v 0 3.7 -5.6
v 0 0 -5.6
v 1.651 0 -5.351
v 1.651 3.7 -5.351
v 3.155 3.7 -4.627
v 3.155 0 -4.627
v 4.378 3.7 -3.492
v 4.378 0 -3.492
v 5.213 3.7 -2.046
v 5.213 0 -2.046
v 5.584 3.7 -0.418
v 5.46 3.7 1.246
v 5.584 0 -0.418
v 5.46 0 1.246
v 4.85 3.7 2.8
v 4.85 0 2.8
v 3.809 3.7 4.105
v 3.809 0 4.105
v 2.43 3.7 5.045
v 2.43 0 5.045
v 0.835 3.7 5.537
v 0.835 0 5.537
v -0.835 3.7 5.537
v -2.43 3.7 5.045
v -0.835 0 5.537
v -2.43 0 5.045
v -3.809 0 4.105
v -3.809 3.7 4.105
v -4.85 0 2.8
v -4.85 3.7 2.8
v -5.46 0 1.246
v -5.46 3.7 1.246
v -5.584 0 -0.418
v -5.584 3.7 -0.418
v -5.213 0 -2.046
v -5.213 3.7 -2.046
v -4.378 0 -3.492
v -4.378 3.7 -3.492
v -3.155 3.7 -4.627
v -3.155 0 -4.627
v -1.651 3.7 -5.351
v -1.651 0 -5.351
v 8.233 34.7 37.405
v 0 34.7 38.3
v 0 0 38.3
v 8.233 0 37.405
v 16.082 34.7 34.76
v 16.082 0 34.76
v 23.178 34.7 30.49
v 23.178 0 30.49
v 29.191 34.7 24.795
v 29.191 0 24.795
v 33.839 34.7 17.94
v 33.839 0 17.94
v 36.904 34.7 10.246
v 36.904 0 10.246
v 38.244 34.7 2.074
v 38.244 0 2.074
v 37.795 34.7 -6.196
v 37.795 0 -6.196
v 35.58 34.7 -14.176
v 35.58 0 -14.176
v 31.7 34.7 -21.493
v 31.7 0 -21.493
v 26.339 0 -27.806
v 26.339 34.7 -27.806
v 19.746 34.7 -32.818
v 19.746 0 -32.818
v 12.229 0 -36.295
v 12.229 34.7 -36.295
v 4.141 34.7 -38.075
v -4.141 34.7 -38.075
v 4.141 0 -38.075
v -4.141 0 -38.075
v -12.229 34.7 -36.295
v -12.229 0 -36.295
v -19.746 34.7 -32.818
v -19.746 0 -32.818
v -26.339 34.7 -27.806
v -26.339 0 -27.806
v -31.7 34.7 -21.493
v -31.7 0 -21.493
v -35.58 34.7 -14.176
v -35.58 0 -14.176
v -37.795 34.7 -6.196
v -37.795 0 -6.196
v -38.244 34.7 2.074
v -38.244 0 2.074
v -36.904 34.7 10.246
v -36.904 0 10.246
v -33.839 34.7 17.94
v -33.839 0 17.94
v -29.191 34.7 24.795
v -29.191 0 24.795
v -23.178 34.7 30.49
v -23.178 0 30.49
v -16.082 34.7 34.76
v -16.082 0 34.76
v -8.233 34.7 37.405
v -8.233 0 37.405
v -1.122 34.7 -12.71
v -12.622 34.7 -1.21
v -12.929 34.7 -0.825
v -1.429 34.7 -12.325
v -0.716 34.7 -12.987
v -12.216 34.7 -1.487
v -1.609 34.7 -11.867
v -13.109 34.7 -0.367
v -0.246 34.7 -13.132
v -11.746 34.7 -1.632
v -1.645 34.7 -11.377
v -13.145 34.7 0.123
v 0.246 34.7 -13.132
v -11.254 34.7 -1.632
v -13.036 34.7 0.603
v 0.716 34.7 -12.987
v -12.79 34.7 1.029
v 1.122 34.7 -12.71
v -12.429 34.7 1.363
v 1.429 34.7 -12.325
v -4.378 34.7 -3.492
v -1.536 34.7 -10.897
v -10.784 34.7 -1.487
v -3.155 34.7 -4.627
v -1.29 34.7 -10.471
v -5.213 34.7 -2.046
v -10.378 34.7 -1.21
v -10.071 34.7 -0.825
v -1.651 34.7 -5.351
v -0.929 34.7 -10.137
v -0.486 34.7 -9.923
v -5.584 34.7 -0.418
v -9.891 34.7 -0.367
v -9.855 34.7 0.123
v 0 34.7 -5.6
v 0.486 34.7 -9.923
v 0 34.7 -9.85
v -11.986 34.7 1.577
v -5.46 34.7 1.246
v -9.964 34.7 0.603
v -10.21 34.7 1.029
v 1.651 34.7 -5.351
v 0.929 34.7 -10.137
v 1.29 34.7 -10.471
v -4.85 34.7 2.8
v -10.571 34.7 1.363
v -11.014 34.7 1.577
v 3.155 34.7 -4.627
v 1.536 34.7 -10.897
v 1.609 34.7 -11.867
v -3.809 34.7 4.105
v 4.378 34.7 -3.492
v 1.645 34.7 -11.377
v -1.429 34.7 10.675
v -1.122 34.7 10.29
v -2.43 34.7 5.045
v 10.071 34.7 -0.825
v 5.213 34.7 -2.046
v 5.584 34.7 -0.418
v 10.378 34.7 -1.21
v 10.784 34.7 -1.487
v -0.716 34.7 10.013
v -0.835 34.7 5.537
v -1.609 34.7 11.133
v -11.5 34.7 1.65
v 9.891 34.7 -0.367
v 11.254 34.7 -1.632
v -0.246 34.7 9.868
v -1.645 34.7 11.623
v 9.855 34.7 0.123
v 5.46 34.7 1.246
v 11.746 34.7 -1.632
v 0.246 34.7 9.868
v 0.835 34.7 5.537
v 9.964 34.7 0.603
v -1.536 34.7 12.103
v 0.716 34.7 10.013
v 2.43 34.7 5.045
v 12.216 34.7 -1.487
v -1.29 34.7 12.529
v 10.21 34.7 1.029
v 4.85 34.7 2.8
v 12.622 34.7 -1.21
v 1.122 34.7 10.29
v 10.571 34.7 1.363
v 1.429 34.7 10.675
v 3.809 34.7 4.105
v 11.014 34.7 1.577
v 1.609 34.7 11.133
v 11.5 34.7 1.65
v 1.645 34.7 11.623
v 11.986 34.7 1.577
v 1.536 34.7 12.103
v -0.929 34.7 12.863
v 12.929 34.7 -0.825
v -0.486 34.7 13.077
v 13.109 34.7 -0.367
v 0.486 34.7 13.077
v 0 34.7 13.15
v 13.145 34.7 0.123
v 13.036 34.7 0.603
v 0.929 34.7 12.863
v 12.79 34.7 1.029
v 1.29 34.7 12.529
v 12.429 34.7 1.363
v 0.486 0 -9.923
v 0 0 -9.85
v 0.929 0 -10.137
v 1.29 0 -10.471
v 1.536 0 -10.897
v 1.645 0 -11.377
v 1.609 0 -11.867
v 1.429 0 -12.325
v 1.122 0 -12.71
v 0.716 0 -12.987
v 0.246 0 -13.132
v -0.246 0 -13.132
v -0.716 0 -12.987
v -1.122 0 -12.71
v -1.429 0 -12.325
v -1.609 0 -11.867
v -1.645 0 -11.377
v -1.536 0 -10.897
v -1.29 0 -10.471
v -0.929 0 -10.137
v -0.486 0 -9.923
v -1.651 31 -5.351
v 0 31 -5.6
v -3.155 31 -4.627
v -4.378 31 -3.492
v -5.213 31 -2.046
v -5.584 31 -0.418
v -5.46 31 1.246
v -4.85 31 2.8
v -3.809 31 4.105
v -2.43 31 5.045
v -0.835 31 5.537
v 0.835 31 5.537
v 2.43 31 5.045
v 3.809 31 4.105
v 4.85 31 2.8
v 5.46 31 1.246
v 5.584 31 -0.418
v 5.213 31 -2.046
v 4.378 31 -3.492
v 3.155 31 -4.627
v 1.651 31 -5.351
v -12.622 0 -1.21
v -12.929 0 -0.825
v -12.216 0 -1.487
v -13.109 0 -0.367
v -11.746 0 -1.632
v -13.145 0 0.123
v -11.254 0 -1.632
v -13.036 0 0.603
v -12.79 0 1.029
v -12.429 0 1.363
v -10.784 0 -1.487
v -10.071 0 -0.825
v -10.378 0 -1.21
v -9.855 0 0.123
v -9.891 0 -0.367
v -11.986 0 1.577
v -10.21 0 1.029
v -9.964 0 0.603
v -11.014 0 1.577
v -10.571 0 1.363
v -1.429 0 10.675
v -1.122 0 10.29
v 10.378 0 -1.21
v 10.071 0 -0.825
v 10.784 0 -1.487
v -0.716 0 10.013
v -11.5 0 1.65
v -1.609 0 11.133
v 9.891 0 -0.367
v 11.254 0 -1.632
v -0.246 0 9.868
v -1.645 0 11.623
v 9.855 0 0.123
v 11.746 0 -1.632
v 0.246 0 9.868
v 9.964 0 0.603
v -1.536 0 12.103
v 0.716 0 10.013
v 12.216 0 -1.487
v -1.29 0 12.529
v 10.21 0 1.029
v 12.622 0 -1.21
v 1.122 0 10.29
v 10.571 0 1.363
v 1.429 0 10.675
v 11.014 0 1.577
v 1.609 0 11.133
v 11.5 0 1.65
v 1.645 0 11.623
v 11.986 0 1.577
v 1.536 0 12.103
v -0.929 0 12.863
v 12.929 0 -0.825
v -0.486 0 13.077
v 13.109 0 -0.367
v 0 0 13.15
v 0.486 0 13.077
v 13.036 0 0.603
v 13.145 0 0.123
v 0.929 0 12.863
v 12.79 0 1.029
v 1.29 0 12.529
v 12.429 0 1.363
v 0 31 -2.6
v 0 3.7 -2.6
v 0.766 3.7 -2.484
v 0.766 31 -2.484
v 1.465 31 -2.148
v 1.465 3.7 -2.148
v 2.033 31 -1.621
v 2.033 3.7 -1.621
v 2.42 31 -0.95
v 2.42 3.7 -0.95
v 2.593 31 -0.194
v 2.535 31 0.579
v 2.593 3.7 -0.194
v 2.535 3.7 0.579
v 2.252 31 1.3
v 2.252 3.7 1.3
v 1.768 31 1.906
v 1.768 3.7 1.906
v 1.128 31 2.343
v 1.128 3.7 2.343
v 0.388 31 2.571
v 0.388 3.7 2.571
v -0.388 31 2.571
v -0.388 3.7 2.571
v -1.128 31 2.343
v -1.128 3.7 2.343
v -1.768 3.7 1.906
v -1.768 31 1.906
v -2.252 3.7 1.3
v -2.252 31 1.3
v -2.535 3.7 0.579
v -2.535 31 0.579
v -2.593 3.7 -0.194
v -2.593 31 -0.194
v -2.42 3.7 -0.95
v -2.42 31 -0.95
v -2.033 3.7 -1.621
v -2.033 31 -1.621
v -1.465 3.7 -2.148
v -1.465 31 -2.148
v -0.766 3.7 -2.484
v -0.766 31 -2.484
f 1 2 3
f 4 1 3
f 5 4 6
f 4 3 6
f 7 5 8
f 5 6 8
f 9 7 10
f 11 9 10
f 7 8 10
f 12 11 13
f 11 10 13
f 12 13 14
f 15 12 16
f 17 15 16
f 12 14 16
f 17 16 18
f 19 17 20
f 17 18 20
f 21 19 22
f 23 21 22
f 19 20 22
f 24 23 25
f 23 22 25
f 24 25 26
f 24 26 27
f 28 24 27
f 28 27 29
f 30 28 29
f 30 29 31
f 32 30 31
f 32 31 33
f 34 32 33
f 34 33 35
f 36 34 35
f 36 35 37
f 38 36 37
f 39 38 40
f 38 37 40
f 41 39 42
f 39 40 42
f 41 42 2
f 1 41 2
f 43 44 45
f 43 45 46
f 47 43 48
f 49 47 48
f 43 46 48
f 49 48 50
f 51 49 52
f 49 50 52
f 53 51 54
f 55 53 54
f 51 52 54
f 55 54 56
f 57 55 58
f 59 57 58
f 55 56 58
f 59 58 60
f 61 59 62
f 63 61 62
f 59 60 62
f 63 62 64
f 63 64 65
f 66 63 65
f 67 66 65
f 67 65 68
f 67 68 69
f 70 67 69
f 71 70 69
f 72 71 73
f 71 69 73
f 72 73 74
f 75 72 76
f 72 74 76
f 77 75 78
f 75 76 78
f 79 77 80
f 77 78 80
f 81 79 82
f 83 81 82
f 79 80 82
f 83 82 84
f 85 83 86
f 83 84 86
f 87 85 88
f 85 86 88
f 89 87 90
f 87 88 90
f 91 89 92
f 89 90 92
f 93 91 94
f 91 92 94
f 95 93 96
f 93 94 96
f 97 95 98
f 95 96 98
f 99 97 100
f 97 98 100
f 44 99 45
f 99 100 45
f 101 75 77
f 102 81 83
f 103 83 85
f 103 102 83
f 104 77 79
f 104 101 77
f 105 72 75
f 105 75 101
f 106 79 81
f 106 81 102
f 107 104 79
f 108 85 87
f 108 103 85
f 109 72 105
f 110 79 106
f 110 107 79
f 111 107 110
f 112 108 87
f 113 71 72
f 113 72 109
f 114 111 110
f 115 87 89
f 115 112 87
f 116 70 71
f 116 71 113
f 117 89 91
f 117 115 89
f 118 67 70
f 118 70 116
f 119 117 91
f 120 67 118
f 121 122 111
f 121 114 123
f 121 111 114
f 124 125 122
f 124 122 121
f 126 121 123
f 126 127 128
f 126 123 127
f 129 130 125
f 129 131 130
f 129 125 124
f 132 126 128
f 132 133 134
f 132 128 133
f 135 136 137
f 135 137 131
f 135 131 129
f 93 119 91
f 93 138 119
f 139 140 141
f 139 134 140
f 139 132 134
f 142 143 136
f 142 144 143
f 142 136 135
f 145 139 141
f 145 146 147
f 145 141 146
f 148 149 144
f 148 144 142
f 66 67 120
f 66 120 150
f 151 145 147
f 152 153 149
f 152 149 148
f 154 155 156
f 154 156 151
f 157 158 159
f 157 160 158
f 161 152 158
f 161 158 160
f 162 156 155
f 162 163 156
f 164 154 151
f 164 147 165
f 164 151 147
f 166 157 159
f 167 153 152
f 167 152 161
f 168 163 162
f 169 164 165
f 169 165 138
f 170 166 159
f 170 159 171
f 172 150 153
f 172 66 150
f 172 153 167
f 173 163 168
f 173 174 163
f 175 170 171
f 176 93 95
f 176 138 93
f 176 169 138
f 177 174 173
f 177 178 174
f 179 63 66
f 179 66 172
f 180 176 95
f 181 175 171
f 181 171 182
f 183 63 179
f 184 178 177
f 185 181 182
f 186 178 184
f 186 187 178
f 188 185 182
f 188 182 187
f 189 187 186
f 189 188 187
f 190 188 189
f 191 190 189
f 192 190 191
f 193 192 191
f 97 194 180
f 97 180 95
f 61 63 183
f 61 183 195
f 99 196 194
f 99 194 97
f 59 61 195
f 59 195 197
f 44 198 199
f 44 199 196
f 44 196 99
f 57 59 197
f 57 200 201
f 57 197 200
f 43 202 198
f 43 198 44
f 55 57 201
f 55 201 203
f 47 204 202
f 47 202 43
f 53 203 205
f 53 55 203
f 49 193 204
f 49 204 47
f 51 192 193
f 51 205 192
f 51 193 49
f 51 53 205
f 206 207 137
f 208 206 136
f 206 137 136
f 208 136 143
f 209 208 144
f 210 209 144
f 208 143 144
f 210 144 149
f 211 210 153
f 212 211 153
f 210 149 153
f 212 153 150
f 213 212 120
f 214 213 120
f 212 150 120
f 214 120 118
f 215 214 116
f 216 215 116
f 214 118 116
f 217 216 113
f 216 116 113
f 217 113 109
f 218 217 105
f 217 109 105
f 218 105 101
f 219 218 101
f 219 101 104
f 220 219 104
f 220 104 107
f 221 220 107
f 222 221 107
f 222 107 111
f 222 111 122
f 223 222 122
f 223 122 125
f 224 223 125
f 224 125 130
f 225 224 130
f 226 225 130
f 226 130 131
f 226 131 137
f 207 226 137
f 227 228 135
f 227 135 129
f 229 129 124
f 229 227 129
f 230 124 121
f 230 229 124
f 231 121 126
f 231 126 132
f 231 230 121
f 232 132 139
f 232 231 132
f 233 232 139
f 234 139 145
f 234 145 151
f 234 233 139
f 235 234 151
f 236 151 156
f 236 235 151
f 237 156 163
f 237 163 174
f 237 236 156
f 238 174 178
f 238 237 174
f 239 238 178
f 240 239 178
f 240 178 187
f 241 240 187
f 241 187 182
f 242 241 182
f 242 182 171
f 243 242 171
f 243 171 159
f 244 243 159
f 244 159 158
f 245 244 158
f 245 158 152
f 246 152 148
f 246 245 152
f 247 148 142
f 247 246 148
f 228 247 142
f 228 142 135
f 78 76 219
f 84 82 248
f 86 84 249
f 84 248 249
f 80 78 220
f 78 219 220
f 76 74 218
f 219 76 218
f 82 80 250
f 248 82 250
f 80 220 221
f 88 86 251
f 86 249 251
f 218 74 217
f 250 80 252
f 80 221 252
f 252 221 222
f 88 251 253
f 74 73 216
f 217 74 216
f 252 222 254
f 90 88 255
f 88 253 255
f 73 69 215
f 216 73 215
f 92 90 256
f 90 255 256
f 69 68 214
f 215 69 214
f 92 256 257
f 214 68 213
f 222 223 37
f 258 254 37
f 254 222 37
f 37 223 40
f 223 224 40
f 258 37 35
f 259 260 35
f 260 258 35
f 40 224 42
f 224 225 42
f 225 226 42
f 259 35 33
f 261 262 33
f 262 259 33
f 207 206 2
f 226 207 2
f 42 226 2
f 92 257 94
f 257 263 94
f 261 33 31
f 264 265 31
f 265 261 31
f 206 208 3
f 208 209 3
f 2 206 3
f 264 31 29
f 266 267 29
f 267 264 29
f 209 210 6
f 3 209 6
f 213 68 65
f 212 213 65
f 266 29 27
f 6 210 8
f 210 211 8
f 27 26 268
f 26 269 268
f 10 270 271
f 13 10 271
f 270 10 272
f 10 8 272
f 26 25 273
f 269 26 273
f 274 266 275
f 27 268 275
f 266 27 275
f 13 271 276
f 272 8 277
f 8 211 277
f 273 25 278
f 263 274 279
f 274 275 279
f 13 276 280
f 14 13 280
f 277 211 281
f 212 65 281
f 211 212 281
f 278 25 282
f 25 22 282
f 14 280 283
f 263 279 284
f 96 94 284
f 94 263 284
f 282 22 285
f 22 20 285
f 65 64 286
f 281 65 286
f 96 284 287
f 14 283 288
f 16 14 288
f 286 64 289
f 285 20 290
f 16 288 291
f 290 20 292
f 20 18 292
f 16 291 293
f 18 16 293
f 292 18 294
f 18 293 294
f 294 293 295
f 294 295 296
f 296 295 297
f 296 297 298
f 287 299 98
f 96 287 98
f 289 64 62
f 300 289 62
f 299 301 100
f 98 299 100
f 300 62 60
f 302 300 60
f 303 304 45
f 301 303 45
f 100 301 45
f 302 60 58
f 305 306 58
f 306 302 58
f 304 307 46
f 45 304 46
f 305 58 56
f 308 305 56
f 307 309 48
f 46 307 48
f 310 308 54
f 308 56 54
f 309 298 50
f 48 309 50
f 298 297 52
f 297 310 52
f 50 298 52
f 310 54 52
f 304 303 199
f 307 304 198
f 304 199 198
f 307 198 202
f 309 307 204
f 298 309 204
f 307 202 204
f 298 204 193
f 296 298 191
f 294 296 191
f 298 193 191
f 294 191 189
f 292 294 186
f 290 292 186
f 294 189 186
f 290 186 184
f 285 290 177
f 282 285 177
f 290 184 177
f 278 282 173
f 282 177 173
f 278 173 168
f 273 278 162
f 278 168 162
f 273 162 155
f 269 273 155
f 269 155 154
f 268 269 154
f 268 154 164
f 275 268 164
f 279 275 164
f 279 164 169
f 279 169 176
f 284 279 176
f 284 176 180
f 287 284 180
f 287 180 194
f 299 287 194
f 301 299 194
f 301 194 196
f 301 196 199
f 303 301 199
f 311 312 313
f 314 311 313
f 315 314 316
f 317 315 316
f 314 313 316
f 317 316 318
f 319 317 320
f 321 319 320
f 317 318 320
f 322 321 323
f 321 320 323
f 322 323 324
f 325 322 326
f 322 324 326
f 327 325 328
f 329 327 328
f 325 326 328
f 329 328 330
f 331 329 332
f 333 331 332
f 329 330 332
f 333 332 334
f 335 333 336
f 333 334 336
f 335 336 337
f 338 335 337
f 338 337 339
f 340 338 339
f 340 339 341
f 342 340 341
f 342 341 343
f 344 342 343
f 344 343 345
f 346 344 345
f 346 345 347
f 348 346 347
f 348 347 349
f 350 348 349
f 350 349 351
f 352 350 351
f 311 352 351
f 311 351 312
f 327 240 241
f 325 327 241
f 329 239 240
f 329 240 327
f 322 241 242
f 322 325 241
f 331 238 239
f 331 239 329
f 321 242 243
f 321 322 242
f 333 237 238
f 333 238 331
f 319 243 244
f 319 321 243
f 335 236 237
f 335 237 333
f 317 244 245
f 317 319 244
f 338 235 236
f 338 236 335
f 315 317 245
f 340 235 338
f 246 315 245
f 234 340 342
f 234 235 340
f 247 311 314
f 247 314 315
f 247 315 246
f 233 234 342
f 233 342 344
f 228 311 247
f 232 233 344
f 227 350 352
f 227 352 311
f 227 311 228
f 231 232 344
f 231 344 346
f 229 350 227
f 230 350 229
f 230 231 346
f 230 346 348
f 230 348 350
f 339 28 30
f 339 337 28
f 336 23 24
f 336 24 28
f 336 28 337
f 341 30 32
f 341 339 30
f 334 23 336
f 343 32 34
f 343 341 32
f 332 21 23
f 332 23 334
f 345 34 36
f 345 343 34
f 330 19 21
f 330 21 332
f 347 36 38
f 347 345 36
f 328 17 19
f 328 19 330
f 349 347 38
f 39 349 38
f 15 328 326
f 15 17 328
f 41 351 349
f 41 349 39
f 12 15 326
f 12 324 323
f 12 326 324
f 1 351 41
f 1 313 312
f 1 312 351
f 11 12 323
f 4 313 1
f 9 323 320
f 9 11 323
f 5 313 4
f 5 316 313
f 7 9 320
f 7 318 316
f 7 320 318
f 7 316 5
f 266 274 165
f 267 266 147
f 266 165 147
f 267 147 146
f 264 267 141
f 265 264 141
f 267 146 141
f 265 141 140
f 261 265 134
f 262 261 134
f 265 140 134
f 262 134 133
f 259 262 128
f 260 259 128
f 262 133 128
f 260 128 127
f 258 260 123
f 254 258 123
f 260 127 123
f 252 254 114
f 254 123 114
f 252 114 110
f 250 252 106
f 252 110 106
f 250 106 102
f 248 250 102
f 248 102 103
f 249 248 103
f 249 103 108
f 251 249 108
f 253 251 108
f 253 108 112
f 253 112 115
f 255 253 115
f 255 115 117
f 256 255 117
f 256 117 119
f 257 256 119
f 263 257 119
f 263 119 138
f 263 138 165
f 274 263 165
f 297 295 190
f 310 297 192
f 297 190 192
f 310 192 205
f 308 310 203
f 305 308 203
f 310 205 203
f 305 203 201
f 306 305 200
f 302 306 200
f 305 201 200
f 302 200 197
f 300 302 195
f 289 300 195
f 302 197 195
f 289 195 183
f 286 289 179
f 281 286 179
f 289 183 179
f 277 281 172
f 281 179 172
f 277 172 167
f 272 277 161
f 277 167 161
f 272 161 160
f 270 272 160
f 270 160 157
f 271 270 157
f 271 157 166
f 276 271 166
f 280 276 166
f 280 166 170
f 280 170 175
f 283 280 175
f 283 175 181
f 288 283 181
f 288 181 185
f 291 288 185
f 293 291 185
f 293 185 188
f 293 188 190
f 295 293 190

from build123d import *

# Parameters (mm, degrees)
SKETCH1_R           = 38.3
BOSS_EXTRUDE1_DEPTH = 34.7
SKETCH2_R           = 2.6
CUT_EXTRUDE2_DEPTH  = 34.7
SKETCH4_R           = 5.6
CUT_EXTRUDE3_DEPTH  = 3.7
CUT_EXTRUDE4_START  = -3.7
SKETCH5_R           = 5.6
CUT_EXTRUDE4_DEPTH  = 3.7
SKETCH6_R           = 1.65
CUT_EXTRUDE5_DEPTH  = 65.326277679


with BuildPart() as part:
    # Sketch1 → Boss-Extrude1 (new body)
    with BuildSketch(Plane(origin=(0, 0, 0), x_dir=(1, 0, 0), z_dir=(0, 1, 0))):
        with Locations(Location((0, 0, 0), (0, 0, 270))):
            Circle(SKETCH1_R)
    extrude(amount=BOSS_EXTRUDE1_DEPTH)

    # Sketch2 → Cut-Extrude2 (cut)
    with BuildSketch(Plane.XZ):
        with Locations(Location((0, 0, 0), (0, 0, 270))):
            Circle(SKETCH2_R)
    extrude(amount=-CUT_EXTRUDE2_DEPTH, mode=Mode.SUBTRACT)

    # Sketch4 → Cut-Extrude3 (cut)
    with BuildSketch(Plane.XZ):
        with Locations(Location((0, 0, 0), (0, 0, 270))):
            Circle(SKETCH4_R)
    extrude(amount=-CUT_EXTRUDE3_DEPTH, mode=Mode.SUBTRACT)

    # Sketch5 → Cut-Extrude4 (cut)
    with BuildSketch(Plane(origin=(0, 34.7, 0), x_dir=(1, 0, 0), z_dir=(0, 1, 0)).offset(CUT_EXTRUDE4_START)):
        with Locations(Location((0, 0, 0), (0, 0, 90))):
            Circle(SKETCH5_R)
    extrude(amount=CUT_EXTRUDE4_DEPTH, mode=Mode.SUBTRACT)

    # Sketch6 → Cut-Extrude5 (cut, through all)
    with BuildSketch(Plane(origin=(0, 34.7, 0), x_dir=(1, 0, 0), z_dir=(0, 1, 0))):
        with Locations(Location((0, 11.5, 0), (0, 0, 270))):
            Circle(SKETCH6_R)
        with Locations(Location((11.5, 0, 0), (0, 0, 270))):
            Circle(SKETCH6_R)
        with Locations(Location((0, -11.5, 0), (0, 0, 270))):
            Circle(SKETCH6_R)
        with Locations(Location((-11.5, 0, 0), (0, 0, 270))):
            Circle(SKETCH6_R)
    extrude(amount=-CUT_EXTRUDE5_DEPTH, mode=Mode.SUBTRACT)


solid = part.part
